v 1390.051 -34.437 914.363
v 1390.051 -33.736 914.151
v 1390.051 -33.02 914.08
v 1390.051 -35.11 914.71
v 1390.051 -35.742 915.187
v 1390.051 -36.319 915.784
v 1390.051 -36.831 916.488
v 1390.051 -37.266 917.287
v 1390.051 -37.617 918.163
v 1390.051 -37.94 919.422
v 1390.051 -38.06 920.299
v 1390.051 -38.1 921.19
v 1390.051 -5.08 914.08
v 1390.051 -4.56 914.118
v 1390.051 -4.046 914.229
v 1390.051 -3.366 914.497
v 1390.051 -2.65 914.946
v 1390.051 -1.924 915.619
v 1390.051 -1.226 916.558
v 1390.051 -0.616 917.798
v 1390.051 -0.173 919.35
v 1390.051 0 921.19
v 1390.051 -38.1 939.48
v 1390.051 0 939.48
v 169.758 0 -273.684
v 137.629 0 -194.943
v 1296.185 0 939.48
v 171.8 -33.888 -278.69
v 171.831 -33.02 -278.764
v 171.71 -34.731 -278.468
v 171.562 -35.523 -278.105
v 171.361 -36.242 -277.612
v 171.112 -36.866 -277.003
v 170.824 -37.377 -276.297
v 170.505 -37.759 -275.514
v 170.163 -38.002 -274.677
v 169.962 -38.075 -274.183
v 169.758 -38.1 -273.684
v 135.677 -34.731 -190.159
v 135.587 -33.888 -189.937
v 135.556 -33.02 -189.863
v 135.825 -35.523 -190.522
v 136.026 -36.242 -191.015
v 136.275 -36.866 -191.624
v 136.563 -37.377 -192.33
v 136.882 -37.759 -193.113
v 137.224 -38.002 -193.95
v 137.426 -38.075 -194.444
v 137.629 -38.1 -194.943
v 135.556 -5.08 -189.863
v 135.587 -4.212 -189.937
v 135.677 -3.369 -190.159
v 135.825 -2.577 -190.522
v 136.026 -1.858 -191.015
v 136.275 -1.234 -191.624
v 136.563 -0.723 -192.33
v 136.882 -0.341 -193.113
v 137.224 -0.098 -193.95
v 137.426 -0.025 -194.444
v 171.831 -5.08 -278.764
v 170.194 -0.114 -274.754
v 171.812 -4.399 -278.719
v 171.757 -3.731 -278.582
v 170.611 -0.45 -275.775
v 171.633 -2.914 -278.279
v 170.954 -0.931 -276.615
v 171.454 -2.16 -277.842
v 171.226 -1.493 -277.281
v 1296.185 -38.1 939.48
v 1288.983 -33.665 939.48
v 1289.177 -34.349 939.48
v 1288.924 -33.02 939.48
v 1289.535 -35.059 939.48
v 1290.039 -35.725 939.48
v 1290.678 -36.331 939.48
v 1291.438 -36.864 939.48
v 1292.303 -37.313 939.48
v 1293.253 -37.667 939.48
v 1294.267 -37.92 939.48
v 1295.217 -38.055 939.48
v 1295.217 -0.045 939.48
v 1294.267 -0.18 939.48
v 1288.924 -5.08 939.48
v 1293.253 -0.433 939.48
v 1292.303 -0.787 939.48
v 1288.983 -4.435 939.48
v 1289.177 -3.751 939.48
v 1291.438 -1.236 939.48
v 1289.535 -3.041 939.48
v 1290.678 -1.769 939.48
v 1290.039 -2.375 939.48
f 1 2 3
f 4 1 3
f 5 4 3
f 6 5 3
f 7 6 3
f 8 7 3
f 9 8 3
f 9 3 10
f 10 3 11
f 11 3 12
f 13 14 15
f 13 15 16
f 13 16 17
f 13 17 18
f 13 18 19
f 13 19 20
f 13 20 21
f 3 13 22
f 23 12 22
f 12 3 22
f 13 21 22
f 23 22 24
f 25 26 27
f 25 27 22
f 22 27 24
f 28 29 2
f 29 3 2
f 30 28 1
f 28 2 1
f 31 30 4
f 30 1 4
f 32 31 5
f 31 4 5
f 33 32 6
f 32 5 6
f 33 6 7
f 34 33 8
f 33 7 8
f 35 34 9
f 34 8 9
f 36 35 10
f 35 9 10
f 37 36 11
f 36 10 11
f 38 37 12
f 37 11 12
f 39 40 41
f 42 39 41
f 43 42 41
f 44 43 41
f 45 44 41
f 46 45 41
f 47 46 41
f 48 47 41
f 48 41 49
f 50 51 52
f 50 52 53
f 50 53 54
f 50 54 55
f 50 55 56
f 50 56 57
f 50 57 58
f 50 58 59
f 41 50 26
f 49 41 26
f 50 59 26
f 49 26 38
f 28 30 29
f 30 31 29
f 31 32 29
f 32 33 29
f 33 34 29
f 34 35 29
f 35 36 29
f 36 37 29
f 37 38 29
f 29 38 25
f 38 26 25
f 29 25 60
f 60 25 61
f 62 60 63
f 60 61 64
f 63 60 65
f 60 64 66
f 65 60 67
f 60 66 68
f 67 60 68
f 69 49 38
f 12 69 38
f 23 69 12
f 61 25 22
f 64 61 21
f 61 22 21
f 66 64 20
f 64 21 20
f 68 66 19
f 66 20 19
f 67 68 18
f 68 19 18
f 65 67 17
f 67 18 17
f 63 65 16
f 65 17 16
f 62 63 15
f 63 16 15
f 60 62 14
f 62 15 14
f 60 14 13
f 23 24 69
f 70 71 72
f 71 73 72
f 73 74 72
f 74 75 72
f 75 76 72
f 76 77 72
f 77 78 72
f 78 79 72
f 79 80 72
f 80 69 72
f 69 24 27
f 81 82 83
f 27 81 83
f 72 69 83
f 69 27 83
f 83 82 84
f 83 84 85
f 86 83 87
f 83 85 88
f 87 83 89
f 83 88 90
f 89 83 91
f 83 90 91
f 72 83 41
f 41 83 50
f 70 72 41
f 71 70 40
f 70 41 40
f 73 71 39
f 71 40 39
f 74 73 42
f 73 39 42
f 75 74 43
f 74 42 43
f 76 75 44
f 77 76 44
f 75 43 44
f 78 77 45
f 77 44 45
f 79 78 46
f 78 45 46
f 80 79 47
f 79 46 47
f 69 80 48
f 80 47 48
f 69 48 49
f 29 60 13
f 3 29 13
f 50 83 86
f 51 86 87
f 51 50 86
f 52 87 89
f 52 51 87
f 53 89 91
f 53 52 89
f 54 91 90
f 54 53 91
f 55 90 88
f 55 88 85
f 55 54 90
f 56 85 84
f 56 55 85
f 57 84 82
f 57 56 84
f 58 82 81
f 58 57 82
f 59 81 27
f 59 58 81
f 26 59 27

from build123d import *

# Parameters (mm, degrees)
F1_DEPTH = 38.1
F2_R     = 5.08
F3_R     = 5.08


with BuildPart() as f1:
    # F0 (on Front) → F1 (new body)
    with BuildSketch(Plane.XZ):
        Polygon((1288.923878, 939.480245), (135.55616, -189.862576), (171.830923, -278.764475), (1390.051439, 914.080245), (1390.051439, 939.480245), align=None)
    extrude(amount=F1_DEPTH)

    # F2
    f2_edges = [f1.edges().sort_by_distance(p)[0] for p in [
        (712.240019, -38.1, 374.808834),
        (712.240019, 0, 374.808834),
        (780.941181, -38.1, 317.657885),
    ]]
    fillet(f2_edges, radius=F2_R)

    # F3
    f3_edges = [f1.edges().sort_by_distance(p)[0] for p in [
        (780.941181, 0, 317.657885),
    ]]
    fillet(f3_edges, radius=F3_R)


solid = f1.part
